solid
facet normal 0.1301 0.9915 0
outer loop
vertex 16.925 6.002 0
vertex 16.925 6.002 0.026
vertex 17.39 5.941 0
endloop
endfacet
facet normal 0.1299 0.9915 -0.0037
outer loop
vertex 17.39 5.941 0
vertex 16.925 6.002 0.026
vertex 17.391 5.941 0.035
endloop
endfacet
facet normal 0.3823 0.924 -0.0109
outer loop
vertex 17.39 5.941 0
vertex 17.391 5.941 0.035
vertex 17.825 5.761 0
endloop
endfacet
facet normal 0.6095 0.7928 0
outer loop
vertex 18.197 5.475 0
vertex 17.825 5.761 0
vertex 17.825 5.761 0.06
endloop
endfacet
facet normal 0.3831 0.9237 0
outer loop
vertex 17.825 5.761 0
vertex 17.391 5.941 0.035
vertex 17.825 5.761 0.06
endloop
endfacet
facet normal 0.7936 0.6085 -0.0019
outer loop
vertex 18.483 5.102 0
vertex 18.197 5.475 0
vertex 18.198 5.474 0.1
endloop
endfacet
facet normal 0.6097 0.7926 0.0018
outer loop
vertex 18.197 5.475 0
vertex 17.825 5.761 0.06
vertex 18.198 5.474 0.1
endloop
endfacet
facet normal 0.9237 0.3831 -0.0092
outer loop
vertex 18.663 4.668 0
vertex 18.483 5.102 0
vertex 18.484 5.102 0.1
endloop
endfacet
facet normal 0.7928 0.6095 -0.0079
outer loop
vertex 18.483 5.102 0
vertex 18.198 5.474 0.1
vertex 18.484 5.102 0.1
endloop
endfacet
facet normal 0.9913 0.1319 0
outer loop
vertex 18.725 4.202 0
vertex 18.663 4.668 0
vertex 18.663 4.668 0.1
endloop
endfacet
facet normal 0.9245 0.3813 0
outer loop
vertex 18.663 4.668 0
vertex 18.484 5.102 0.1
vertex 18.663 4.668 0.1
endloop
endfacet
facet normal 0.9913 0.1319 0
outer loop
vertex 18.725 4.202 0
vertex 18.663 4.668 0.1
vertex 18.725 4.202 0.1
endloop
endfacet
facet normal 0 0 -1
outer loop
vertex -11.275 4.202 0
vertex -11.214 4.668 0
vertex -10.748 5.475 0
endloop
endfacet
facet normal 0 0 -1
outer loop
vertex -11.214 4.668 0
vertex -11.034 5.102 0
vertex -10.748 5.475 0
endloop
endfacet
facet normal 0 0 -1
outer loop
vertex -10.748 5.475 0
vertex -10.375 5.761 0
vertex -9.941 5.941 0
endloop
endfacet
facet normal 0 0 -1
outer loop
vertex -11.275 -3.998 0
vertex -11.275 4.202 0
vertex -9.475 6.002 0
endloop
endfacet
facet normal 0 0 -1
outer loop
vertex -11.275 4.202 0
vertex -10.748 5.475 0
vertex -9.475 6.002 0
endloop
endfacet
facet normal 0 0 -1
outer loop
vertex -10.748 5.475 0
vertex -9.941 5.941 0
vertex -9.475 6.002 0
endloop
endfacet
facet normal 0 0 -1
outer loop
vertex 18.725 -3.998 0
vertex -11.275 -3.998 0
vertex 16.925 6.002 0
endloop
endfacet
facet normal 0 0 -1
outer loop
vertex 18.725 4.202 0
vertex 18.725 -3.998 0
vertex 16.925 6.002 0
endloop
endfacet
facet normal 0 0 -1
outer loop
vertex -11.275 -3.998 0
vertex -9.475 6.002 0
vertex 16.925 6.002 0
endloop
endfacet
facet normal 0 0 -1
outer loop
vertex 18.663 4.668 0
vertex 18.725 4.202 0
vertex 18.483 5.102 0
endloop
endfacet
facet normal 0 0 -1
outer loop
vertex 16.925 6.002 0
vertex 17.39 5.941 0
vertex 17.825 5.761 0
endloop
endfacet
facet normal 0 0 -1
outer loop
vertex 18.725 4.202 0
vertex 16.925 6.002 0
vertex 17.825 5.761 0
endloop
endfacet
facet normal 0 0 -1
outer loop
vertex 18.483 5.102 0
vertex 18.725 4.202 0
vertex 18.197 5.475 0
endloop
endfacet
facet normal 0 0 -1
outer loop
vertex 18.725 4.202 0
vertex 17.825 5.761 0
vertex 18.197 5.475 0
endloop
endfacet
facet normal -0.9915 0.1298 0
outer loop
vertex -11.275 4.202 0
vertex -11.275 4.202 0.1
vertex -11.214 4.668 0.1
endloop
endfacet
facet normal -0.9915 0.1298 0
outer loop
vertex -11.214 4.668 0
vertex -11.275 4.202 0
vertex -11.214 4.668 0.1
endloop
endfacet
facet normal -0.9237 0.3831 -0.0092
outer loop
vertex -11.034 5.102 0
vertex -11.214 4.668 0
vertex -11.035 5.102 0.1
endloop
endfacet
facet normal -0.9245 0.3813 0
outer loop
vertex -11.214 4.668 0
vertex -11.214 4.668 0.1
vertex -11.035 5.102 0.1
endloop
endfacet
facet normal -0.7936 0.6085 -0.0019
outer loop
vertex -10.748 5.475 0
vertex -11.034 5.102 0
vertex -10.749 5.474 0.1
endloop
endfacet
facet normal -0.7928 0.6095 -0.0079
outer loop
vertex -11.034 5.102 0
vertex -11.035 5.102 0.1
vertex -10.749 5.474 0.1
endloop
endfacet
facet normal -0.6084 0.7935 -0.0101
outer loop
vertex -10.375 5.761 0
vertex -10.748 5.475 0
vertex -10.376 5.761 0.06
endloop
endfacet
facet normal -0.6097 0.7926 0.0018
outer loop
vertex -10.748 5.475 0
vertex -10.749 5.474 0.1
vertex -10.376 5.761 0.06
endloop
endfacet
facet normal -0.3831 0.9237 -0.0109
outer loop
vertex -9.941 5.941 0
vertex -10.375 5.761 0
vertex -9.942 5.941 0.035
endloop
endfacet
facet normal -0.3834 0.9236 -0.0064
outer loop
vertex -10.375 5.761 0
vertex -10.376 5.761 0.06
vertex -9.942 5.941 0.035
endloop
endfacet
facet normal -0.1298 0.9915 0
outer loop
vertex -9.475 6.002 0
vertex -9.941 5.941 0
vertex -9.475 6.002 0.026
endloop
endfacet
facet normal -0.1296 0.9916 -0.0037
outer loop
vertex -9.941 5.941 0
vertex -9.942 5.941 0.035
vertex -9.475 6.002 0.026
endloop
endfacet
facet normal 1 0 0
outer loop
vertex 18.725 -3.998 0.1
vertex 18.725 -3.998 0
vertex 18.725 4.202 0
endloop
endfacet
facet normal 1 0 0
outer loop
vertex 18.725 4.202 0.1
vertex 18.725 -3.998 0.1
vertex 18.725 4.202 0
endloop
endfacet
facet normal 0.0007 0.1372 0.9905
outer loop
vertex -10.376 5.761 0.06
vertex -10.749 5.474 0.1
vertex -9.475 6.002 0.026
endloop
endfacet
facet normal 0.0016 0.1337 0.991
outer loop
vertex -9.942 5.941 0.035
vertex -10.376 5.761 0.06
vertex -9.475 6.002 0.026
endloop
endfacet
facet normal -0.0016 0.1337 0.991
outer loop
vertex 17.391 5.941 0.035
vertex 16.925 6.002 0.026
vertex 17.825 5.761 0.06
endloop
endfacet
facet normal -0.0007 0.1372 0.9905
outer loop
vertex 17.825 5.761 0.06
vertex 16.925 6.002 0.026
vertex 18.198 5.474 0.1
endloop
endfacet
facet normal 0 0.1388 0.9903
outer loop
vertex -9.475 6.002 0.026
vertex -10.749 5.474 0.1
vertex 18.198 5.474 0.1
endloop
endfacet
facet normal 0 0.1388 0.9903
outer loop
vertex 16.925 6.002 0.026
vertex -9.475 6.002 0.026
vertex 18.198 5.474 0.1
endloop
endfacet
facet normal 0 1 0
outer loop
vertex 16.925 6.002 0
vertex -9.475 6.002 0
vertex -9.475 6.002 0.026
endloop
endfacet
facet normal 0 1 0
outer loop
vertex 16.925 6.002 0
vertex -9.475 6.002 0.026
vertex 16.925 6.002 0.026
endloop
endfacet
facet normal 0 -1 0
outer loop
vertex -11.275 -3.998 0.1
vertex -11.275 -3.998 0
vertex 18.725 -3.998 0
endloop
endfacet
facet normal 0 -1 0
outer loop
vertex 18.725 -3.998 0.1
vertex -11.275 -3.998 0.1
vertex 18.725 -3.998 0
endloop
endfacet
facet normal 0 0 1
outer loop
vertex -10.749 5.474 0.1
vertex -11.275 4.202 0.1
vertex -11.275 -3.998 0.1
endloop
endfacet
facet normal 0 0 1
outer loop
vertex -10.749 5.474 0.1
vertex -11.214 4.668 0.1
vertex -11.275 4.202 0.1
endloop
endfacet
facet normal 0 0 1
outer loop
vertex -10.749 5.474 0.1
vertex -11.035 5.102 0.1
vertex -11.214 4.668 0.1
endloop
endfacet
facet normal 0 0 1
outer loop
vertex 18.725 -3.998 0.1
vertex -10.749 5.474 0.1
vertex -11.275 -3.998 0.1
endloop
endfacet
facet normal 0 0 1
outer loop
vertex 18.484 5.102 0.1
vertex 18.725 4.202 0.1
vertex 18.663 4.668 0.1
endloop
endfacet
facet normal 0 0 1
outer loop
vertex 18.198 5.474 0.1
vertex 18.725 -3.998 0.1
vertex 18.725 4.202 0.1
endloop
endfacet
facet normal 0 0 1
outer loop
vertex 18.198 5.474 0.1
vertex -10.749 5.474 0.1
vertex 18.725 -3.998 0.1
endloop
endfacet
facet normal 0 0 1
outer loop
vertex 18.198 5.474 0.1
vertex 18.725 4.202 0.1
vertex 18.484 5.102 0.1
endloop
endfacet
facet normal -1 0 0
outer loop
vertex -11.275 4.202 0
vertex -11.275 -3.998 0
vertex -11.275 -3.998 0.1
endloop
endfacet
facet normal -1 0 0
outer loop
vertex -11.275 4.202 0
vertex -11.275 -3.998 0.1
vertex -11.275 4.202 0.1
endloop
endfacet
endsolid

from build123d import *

# Parameters (mm, degrees)
F0_W     = 30
F0_H     = 10
F1_DEPTH = 0.1
F3_DEPTH = 57.2
F4_R     = 1.8


with BuildPart() as f1:
    # F0 (on Top) → F1 (new body)
    with BuildSketch(Plane.XY):
        with Locations((3.724603, 1.00229)):
            Rectangle(F0_W, F0_H)
    extrude(amount=F1_DEPTH)

    # F2 (on face) → F3 (cut)
    with BuildSketch(Plane.YZ.offset(18.724603)):
        Polygon((4.141626, 0.286113), (6.00229, 0.026249), (6.009877, 0.025722), (7.013663, 0.1), (6.508347, 0.436859), align=None)
    extrude(amount=-F3_DEPTH, mode=Mode.SUBTRACT)

    # F4
    f4_edges = [f1.edges().sort_by_distance(p)[0] for p in [
        (18.724603, 6.00229, 0.013124),
        (-11.275397, 6.00229, 0.013124),
    ]]
    fillet(f4_edges, radius=F4_R)


solid = f1.part
